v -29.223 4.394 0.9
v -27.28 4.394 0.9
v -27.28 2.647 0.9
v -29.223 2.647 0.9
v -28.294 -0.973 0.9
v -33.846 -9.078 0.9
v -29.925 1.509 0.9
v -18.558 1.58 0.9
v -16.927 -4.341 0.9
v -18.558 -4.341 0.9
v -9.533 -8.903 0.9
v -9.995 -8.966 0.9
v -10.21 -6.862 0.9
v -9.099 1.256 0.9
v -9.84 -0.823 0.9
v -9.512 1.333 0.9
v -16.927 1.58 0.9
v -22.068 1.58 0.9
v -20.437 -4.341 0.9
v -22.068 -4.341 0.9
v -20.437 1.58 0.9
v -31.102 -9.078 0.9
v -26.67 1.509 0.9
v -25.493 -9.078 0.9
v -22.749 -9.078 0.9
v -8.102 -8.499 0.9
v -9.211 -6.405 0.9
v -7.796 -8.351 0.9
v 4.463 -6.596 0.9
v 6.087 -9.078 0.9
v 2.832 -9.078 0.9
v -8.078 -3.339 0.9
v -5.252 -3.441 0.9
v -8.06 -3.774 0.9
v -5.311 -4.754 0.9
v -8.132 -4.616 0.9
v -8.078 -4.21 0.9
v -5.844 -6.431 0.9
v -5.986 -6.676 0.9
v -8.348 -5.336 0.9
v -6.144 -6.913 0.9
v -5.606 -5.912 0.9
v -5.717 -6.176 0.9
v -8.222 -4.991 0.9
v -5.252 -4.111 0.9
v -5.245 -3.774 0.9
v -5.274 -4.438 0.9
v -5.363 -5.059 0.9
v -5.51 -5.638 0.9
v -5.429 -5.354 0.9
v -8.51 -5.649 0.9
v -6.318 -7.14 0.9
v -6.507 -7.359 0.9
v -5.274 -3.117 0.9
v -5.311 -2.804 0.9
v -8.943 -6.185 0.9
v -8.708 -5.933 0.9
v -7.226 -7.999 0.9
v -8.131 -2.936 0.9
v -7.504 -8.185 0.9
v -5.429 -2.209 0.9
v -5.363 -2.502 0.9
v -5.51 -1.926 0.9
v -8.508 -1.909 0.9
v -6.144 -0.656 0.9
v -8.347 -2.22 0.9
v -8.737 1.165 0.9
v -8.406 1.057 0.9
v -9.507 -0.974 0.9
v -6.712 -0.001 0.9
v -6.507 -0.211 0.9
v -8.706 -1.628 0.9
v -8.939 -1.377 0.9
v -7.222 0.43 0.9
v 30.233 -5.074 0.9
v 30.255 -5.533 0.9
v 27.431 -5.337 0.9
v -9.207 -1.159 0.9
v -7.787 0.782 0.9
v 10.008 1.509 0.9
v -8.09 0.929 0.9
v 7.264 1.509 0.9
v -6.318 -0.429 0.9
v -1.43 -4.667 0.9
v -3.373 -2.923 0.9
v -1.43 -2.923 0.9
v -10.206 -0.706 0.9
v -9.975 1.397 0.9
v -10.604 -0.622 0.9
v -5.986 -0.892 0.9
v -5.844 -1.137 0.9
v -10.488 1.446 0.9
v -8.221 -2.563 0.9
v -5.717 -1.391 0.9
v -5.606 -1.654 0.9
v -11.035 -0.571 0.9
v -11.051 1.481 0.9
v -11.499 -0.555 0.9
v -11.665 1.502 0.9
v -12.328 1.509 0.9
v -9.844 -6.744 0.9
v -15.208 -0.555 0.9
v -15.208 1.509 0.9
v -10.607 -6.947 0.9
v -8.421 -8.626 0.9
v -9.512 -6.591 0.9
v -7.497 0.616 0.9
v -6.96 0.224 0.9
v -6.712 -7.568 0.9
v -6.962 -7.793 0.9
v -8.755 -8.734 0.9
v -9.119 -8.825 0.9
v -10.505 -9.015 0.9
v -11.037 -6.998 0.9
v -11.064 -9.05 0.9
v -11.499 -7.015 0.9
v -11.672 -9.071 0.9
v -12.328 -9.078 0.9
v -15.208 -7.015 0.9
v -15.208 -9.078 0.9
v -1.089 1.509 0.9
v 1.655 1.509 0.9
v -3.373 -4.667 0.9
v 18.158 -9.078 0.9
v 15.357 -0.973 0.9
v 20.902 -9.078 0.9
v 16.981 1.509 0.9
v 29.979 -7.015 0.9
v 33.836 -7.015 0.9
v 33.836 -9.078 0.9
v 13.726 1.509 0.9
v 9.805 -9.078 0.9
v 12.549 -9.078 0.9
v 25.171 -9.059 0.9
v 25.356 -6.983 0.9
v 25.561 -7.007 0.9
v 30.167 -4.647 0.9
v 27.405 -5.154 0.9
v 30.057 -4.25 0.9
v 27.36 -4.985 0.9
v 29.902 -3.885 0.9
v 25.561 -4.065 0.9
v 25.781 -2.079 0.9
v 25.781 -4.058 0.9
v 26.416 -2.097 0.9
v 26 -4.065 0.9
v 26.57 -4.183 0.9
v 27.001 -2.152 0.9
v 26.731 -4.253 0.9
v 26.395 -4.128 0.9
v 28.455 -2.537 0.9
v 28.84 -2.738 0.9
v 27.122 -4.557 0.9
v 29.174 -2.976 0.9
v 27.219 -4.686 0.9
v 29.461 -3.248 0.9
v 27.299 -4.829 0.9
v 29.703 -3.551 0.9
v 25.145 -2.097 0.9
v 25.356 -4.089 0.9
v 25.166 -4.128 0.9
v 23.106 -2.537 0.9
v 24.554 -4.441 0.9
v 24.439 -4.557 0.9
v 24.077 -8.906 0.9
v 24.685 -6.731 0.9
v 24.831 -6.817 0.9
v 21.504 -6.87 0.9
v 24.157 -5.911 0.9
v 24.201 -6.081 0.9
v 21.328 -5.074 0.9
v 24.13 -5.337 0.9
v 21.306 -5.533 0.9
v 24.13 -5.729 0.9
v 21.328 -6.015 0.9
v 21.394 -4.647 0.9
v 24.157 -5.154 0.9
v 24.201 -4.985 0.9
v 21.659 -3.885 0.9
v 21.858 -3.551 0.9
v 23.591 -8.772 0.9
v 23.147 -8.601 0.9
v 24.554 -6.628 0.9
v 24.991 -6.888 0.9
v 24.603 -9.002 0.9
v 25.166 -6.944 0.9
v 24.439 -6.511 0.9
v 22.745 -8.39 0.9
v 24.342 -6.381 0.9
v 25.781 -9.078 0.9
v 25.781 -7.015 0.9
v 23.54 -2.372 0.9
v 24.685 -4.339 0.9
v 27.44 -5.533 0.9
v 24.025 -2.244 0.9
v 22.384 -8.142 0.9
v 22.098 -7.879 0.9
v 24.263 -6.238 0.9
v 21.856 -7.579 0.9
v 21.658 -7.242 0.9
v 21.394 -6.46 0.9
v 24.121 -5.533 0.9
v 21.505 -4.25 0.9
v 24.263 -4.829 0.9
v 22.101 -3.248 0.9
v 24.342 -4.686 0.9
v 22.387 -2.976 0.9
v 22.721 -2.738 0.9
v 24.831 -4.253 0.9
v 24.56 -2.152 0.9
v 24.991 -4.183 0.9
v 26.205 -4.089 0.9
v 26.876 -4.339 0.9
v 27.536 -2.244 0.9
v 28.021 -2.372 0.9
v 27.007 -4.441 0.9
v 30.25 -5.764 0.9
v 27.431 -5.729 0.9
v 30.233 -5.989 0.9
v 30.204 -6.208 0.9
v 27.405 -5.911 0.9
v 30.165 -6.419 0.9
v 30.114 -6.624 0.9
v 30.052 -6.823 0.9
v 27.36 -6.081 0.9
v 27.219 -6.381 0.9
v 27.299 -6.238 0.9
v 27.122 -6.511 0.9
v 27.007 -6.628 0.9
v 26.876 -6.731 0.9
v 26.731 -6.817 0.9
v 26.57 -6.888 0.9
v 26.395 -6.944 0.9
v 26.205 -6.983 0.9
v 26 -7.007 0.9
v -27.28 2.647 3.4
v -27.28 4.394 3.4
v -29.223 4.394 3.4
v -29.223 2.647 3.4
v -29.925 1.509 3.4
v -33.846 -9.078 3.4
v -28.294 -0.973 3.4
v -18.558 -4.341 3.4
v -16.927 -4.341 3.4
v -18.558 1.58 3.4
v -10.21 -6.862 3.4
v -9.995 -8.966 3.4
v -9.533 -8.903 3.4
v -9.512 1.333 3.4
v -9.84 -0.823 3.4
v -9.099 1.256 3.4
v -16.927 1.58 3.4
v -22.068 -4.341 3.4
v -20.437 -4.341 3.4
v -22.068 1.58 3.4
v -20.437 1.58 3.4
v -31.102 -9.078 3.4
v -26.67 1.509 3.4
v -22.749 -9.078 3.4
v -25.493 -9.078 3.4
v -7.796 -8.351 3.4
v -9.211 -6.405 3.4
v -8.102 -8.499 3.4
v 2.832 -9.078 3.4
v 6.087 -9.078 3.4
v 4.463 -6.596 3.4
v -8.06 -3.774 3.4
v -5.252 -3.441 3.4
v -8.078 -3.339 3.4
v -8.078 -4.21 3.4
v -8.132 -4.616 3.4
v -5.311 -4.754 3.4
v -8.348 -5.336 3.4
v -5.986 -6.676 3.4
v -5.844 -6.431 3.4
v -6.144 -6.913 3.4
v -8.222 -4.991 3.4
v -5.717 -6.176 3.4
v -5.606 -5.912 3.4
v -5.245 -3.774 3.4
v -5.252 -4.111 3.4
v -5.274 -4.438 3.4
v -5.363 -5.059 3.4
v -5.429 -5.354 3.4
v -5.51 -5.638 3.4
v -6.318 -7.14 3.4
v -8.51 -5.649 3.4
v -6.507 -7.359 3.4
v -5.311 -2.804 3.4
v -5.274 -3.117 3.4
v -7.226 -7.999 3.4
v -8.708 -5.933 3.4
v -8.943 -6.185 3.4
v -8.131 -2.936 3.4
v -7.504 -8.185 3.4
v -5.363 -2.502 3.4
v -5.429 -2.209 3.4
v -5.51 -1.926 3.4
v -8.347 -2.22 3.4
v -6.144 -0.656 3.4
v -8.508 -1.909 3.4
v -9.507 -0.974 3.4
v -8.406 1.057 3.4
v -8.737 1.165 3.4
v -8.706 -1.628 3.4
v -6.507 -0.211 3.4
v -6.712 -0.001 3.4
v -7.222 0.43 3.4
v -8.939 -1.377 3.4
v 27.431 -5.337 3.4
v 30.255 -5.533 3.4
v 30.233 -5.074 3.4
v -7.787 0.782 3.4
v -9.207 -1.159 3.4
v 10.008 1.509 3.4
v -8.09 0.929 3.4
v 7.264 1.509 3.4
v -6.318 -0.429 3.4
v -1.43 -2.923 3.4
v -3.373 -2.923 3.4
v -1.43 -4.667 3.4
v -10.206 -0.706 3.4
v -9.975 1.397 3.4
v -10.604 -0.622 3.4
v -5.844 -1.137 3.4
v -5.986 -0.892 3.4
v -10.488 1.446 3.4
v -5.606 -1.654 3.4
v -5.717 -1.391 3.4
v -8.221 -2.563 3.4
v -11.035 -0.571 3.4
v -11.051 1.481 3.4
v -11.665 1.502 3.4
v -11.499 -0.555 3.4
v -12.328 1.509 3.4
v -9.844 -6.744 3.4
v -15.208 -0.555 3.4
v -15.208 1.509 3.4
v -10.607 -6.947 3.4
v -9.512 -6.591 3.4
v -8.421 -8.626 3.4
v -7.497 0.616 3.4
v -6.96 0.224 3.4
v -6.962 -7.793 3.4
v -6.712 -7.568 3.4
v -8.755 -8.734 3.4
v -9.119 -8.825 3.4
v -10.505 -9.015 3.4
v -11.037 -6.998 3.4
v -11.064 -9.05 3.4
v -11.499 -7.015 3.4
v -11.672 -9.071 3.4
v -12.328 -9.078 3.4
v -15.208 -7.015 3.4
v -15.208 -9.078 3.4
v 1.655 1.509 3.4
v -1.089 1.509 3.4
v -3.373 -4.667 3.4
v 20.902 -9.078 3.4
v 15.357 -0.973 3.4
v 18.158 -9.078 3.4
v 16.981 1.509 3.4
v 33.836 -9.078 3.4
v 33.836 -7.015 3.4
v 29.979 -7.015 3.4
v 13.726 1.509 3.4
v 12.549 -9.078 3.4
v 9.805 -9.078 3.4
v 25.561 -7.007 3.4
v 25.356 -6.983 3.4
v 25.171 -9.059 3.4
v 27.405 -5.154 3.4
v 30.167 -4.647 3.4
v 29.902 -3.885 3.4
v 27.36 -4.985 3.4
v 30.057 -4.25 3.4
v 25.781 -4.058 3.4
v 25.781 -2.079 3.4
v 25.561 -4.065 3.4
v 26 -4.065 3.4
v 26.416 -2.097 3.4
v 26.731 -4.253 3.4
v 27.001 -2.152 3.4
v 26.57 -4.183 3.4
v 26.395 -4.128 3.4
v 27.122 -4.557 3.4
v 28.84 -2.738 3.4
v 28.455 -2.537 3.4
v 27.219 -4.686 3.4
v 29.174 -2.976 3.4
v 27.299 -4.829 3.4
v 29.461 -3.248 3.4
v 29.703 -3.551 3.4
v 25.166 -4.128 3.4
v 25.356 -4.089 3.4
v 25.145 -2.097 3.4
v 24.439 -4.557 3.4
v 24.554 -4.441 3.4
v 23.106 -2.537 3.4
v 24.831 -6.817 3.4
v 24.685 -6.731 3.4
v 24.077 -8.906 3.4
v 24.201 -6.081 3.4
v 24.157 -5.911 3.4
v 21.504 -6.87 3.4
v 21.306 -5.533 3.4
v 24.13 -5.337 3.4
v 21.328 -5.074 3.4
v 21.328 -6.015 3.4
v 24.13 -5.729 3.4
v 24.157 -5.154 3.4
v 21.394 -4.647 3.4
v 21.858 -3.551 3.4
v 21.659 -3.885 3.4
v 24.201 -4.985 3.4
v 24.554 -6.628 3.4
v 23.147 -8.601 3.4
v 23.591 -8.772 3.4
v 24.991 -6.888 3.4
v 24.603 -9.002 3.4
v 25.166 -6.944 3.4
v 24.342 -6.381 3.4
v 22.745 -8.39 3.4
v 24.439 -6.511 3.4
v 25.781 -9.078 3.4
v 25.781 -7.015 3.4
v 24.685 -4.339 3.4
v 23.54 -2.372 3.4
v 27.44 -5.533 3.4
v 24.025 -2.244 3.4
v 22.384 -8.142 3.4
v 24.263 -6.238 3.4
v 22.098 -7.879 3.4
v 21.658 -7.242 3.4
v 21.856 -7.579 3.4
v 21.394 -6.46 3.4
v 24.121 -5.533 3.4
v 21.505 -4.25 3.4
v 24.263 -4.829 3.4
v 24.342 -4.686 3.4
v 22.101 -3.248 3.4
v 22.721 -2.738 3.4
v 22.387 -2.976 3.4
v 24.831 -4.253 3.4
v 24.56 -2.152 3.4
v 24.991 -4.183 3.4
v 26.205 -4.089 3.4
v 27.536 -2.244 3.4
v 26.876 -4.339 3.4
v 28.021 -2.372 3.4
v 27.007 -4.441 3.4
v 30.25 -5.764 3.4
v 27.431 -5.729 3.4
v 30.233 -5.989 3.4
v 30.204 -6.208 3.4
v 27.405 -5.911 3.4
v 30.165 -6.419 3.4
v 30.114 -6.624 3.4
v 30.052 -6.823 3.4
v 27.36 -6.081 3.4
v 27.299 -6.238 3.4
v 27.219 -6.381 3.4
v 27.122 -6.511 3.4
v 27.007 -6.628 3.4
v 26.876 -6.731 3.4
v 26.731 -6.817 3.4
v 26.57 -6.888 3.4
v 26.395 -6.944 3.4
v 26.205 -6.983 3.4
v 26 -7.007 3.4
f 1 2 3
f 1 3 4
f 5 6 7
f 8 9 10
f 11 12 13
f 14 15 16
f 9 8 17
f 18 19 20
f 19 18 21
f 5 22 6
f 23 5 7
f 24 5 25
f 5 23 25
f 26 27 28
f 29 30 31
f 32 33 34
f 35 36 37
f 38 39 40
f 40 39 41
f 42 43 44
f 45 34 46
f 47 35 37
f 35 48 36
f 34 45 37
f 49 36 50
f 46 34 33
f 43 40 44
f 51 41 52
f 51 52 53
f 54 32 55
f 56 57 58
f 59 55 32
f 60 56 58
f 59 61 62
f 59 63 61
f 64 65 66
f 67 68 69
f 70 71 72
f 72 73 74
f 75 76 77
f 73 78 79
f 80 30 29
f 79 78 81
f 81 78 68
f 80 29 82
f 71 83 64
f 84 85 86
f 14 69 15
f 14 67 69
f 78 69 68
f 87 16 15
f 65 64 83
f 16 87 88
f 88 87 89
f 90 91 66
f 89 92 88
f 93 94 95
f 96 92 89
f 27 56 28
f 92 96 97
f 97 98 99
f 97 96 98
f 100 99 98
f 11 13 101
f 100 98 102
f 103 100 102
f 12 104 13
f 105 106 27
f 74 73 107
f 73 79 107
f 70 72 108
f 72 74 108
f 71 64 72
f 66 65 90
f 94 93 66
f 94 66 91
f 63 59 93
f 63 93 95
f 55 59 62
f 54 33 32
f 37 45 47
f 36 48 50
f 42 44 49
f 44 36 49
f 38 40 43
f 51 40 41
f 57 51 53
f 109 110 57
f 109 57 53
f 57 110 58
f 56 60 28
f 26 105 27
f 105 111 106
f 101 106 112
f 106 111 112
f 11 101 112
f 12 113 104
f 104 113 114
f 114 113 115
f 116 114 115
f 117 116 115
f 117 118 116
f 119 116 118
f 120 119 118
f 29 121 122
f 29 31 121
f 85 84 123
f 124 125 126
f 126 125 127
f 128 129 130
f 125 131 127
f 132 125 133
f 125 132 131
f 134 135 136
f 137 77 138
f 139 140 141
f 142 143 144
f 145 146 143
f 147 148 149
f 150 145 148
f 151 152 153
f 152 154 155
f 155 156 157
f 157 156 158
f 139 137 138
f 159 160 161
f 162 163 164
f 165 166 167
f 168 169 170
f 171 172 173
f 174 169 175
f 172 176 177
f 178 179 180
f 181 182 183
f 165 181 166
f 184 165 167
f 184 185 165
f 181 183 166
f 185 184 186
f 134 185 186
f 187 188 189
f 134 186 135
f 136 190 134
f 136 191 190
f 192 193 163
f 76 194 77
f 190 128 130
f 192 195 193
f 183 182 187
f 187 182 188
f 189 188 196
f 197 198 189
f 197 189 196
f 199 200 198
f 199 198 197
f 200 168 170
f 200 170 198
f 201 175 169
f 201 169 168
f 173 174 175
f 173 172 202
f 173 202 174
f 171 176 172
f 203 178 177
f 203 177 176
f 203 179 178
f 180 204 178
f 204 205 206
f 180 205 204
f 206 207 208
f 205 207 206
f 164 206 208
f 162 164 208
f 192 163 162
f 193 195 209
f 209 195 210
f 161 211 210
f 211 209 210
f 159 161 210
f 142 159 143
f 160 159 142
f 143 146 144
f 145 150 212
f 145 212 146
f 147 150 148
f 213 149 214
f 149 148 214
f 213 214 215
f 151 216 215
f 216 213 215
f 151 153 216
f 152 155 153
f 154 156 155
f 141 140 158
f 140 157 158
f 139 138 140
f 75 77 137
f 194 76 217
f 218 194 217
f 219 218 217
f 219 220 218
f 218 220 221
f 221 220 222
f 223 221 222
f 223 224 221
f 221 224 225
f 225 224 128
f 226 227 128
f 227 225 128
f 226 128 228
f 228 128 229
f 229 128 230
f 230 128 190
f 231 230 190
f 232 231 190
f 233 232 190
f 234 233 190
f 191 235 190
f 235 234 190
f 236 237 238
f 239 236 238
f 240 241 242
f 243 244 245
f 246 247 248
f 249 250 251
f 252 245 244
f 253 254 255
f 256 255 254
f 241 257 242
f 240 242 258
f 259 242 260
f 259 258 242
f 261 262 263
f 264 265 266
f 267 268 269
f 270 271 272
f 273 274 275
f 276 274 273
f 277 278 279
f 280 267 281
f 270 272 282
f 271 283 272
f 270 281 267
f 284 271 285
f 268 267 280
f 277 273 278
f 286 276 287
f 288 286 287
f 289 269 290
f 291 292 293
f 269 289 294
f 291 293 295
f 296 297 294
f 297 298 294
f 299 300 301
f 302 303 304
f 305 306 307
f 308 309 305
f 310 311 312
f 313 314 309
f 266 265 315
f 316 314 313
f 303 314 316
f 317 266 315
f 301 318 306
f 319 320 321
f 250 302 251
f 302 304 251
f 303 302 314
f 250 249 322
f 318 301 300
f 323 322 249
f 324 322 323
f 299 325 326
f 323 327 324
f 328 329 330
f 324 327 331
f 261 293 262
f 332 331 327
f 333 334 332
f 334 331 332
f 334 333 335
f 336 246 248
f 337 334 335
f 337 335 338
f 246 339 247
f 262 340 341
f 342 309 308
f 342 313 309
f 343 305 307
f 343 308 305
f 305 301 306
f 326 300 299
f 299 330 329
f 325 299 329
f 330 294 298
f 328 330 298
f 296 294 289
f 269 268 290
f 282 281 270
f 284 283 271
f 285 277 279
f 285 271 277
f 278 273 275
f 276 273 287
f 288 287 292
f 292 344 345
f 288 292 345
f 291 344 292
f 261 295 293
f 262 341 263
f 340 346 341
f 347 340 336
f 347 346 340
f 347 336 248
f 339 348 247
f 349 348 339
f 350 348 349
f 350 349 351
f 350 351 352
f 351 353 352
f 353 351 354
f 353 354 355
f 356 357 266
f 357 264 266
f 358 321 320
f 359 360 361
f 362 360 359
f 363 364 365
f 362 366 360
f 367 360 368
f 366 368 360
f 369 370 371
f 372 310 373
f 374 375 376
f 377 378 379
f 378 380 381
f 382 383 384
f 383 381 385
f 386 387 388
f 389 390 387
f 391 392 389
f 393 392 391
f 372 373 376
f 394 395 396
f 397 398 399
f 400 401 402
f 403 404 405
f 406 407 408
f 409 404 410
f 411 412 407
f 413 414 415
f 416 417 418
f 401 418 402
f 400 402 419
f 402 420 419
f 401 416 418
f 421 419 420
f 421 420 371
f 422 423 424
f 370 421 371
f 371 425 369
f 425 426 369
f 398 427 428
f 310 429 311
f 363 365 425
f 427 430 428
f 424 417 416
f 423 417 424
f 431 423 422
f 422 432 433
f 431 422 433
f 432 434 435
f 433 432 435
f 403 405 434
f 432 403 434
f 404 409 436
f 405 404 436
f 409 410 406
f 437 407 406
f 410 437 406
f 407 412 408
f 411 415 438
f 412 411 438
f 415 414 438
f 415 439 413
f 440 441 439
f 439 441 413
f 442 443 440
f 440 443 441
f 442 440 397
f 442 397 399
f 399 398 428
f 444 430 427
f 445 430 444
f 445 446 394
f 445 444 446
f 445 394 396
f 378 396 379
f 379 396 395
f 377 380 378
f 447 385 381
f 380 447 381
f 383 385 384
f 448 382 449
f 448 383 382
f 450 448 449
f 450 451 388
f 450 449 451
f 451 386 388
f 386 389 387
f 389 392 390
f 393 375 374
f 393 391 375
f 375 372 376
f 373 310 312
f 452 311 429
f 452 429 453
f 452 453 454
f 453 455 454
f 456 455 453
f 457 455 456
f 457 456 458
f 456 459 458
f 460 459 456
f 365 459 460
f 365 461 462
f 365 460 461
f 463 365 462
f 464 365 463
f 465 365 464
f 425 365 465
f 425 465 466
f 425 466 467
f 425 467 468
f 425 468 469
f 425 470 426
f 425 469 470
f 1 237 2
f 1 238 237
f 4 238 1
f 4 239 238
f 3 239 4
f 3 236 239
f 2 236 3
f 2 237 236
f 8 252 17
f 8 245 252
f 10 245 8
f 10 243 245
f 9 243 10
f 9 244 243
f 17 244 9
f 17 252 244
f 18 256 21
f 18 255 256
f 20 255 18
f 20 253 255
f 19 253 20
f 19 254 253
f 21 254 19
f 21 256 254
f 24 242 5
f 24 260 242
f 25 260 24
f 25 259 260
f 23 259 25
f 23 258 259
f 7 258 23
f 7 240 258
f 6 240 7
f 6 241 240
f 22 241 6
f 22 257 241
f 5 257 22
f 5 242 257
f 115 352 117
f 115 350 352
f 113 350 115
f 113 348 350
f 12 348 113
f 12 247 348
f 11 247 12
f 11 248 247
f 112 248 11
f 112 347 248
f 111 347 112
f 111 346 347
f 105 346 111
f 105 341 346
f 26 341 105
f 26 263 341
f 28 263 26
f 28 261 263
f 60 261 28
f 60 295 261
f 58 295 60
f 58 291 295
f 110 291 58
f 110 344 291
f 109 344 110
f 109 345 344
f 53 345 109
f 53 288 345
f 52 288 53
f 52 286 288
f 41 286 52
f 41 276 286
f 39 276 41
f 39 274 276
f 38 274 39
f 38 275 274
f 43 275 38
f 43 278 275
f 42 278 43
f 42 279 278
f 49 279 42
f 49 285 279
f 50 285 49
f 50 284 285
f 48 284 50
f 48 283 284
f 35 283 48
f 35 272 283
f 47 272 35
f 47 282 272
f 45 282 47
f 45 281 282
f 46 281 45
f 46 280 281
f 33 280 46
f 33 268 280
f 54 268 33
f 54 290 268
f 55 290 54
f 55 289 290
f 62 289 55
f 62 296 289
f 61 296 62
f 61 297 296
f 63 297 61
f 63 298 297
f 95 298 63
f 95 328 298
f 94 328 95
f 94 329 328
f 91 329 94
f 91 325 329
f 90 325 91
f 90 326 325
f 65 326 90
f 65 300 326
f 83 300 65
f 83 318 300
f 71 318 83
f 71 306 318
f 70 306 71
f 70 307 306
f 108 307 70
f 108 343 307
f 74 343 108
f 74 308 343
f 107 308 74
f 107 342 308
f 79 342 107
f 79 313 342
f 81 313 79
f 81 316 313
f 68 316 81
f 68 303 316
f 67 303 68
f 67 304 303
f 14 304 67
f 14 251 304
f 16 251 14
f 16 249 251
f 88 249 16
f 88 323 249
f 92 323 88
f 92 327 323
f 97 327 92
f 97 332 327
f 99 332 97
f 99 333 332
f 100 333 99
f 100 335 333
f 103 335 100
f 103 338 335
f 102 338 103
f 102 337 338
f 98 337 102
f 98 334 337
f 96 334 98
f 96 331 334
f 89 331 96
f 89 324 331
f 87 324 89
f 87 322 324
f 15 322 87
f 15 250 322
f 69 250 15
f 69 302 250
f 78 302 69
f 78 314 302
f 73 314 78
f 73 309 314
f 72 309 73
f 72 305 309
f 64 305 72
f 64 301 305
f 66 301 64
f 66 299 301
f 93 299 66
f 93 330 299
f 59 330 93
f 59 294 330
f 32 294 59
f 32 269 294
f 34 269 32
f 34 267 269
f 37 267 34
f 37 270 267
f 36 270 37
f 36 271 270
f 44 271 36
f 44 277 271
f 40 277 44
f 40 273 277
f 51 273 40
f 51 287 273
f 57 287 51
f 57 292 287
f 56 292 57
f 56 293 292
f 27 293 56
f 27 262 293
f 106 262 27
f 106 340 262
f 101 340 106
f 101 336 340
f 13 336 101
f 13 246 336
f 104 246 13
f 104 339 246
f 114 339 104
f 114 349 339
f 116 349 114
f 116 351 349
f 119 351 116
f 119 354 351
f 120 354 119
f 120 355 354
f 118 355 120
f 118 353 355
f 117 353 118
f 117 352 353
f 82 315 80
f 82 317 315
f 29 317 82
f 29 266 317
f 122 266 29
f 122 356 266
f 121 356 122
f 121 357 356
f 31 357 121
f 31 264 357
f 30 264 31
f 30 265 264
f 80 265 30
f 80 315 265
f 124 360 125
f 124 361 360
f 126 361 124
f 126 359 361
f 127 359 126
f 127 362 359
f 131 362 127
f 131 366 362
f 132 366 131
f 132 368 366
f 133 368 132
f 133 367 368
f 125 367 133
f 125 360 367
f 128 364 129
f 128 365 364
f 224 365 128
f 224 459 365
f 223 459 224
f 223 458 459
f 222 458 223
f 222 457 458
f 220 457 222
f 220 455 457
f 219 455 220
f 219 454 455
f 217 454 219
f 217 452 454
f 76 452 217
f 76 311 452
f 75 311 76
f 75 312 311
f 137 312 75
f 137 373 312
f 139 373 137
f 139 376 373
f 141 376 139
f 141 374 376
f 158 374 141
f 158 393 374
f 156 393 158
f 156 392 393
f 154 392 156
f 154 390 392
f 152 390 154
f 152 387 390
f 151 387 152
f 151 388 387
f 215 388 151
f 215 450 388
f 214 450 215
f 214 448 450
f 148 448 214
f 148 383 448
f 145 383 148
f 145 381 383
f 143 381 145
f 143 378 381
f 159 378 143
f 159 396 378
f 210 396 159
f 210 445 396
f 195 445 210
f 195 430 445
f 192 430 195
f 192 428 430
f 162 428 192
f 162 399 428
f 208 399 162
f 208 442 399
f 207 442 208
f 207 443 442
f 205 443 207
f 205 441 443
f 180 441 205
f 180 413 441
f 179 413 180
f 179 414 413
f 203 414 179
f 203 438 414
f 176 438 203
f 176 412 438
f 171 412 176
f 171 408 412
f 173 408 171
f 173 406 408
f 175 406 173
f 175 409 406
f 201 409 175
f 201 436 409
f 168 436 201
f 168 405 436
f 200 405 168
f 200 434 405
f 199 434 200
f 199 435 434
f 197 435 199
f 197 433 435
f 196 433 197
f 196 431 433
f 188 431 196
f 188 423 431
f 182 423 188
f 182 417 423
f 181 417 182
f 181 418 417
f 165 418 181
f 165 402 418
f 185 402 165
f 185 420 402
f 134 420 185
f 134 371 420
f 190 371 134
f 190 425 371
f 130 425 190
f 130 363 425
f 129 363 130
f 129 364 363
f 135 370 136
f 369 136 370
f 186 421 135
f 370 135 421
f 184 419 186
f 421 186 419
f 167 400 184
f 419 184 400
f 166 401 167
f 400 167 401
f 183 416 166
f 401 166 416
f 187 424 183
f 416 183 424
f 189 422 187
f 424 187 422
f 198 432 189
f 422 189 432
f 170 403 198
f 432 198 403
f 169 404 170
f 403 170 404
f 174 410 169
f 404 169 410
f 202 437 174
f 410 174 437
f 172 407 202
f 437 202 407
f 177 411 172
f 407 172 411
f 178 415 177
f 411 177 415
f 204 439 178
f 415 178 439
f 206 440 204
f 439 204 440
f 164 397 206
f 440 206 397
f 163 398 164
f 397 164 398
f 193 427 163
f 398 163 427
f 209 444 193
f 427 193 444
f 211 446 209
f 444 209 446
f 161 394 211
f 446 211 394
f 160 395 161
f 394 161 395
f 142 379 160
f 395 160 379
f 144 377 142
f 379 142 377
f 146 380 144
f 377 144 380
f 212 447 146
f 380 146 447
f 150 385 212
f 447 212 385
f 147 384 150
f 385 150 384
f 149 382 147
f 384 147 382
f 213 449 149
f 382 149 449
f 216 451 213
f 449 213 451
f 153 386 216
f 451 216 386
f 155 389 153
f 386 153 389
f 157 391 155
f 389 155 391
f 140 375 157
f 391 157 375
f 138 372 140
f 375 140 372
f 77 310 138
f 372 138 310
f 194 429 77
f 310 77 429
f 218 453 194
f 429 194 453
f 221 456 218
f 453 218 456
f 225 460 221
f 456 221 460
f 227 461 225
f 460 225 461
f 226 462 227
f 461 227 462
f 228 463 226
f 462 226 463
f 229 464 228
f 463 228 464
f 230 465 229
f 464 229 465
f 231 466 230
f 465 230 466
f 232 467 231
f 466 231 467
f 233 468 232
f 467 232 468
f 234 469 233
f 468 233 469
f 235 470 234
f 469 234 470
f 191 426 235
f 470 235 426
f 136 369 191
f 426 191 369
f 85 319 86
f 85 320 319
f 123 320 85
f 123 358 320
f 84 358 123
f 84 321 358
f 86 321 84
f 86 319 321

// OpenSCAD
$fn = 48;
  // syllabics (overlaid on icon, tallest)
  translate([0, -2.500, 0.900]) linear_extrude(height=2.500) text("ᐲᐦᑐᐺᐱᓇ", size=10.457, halign="center", valign="center", font="Euphemia UCAS:style=Bold");
